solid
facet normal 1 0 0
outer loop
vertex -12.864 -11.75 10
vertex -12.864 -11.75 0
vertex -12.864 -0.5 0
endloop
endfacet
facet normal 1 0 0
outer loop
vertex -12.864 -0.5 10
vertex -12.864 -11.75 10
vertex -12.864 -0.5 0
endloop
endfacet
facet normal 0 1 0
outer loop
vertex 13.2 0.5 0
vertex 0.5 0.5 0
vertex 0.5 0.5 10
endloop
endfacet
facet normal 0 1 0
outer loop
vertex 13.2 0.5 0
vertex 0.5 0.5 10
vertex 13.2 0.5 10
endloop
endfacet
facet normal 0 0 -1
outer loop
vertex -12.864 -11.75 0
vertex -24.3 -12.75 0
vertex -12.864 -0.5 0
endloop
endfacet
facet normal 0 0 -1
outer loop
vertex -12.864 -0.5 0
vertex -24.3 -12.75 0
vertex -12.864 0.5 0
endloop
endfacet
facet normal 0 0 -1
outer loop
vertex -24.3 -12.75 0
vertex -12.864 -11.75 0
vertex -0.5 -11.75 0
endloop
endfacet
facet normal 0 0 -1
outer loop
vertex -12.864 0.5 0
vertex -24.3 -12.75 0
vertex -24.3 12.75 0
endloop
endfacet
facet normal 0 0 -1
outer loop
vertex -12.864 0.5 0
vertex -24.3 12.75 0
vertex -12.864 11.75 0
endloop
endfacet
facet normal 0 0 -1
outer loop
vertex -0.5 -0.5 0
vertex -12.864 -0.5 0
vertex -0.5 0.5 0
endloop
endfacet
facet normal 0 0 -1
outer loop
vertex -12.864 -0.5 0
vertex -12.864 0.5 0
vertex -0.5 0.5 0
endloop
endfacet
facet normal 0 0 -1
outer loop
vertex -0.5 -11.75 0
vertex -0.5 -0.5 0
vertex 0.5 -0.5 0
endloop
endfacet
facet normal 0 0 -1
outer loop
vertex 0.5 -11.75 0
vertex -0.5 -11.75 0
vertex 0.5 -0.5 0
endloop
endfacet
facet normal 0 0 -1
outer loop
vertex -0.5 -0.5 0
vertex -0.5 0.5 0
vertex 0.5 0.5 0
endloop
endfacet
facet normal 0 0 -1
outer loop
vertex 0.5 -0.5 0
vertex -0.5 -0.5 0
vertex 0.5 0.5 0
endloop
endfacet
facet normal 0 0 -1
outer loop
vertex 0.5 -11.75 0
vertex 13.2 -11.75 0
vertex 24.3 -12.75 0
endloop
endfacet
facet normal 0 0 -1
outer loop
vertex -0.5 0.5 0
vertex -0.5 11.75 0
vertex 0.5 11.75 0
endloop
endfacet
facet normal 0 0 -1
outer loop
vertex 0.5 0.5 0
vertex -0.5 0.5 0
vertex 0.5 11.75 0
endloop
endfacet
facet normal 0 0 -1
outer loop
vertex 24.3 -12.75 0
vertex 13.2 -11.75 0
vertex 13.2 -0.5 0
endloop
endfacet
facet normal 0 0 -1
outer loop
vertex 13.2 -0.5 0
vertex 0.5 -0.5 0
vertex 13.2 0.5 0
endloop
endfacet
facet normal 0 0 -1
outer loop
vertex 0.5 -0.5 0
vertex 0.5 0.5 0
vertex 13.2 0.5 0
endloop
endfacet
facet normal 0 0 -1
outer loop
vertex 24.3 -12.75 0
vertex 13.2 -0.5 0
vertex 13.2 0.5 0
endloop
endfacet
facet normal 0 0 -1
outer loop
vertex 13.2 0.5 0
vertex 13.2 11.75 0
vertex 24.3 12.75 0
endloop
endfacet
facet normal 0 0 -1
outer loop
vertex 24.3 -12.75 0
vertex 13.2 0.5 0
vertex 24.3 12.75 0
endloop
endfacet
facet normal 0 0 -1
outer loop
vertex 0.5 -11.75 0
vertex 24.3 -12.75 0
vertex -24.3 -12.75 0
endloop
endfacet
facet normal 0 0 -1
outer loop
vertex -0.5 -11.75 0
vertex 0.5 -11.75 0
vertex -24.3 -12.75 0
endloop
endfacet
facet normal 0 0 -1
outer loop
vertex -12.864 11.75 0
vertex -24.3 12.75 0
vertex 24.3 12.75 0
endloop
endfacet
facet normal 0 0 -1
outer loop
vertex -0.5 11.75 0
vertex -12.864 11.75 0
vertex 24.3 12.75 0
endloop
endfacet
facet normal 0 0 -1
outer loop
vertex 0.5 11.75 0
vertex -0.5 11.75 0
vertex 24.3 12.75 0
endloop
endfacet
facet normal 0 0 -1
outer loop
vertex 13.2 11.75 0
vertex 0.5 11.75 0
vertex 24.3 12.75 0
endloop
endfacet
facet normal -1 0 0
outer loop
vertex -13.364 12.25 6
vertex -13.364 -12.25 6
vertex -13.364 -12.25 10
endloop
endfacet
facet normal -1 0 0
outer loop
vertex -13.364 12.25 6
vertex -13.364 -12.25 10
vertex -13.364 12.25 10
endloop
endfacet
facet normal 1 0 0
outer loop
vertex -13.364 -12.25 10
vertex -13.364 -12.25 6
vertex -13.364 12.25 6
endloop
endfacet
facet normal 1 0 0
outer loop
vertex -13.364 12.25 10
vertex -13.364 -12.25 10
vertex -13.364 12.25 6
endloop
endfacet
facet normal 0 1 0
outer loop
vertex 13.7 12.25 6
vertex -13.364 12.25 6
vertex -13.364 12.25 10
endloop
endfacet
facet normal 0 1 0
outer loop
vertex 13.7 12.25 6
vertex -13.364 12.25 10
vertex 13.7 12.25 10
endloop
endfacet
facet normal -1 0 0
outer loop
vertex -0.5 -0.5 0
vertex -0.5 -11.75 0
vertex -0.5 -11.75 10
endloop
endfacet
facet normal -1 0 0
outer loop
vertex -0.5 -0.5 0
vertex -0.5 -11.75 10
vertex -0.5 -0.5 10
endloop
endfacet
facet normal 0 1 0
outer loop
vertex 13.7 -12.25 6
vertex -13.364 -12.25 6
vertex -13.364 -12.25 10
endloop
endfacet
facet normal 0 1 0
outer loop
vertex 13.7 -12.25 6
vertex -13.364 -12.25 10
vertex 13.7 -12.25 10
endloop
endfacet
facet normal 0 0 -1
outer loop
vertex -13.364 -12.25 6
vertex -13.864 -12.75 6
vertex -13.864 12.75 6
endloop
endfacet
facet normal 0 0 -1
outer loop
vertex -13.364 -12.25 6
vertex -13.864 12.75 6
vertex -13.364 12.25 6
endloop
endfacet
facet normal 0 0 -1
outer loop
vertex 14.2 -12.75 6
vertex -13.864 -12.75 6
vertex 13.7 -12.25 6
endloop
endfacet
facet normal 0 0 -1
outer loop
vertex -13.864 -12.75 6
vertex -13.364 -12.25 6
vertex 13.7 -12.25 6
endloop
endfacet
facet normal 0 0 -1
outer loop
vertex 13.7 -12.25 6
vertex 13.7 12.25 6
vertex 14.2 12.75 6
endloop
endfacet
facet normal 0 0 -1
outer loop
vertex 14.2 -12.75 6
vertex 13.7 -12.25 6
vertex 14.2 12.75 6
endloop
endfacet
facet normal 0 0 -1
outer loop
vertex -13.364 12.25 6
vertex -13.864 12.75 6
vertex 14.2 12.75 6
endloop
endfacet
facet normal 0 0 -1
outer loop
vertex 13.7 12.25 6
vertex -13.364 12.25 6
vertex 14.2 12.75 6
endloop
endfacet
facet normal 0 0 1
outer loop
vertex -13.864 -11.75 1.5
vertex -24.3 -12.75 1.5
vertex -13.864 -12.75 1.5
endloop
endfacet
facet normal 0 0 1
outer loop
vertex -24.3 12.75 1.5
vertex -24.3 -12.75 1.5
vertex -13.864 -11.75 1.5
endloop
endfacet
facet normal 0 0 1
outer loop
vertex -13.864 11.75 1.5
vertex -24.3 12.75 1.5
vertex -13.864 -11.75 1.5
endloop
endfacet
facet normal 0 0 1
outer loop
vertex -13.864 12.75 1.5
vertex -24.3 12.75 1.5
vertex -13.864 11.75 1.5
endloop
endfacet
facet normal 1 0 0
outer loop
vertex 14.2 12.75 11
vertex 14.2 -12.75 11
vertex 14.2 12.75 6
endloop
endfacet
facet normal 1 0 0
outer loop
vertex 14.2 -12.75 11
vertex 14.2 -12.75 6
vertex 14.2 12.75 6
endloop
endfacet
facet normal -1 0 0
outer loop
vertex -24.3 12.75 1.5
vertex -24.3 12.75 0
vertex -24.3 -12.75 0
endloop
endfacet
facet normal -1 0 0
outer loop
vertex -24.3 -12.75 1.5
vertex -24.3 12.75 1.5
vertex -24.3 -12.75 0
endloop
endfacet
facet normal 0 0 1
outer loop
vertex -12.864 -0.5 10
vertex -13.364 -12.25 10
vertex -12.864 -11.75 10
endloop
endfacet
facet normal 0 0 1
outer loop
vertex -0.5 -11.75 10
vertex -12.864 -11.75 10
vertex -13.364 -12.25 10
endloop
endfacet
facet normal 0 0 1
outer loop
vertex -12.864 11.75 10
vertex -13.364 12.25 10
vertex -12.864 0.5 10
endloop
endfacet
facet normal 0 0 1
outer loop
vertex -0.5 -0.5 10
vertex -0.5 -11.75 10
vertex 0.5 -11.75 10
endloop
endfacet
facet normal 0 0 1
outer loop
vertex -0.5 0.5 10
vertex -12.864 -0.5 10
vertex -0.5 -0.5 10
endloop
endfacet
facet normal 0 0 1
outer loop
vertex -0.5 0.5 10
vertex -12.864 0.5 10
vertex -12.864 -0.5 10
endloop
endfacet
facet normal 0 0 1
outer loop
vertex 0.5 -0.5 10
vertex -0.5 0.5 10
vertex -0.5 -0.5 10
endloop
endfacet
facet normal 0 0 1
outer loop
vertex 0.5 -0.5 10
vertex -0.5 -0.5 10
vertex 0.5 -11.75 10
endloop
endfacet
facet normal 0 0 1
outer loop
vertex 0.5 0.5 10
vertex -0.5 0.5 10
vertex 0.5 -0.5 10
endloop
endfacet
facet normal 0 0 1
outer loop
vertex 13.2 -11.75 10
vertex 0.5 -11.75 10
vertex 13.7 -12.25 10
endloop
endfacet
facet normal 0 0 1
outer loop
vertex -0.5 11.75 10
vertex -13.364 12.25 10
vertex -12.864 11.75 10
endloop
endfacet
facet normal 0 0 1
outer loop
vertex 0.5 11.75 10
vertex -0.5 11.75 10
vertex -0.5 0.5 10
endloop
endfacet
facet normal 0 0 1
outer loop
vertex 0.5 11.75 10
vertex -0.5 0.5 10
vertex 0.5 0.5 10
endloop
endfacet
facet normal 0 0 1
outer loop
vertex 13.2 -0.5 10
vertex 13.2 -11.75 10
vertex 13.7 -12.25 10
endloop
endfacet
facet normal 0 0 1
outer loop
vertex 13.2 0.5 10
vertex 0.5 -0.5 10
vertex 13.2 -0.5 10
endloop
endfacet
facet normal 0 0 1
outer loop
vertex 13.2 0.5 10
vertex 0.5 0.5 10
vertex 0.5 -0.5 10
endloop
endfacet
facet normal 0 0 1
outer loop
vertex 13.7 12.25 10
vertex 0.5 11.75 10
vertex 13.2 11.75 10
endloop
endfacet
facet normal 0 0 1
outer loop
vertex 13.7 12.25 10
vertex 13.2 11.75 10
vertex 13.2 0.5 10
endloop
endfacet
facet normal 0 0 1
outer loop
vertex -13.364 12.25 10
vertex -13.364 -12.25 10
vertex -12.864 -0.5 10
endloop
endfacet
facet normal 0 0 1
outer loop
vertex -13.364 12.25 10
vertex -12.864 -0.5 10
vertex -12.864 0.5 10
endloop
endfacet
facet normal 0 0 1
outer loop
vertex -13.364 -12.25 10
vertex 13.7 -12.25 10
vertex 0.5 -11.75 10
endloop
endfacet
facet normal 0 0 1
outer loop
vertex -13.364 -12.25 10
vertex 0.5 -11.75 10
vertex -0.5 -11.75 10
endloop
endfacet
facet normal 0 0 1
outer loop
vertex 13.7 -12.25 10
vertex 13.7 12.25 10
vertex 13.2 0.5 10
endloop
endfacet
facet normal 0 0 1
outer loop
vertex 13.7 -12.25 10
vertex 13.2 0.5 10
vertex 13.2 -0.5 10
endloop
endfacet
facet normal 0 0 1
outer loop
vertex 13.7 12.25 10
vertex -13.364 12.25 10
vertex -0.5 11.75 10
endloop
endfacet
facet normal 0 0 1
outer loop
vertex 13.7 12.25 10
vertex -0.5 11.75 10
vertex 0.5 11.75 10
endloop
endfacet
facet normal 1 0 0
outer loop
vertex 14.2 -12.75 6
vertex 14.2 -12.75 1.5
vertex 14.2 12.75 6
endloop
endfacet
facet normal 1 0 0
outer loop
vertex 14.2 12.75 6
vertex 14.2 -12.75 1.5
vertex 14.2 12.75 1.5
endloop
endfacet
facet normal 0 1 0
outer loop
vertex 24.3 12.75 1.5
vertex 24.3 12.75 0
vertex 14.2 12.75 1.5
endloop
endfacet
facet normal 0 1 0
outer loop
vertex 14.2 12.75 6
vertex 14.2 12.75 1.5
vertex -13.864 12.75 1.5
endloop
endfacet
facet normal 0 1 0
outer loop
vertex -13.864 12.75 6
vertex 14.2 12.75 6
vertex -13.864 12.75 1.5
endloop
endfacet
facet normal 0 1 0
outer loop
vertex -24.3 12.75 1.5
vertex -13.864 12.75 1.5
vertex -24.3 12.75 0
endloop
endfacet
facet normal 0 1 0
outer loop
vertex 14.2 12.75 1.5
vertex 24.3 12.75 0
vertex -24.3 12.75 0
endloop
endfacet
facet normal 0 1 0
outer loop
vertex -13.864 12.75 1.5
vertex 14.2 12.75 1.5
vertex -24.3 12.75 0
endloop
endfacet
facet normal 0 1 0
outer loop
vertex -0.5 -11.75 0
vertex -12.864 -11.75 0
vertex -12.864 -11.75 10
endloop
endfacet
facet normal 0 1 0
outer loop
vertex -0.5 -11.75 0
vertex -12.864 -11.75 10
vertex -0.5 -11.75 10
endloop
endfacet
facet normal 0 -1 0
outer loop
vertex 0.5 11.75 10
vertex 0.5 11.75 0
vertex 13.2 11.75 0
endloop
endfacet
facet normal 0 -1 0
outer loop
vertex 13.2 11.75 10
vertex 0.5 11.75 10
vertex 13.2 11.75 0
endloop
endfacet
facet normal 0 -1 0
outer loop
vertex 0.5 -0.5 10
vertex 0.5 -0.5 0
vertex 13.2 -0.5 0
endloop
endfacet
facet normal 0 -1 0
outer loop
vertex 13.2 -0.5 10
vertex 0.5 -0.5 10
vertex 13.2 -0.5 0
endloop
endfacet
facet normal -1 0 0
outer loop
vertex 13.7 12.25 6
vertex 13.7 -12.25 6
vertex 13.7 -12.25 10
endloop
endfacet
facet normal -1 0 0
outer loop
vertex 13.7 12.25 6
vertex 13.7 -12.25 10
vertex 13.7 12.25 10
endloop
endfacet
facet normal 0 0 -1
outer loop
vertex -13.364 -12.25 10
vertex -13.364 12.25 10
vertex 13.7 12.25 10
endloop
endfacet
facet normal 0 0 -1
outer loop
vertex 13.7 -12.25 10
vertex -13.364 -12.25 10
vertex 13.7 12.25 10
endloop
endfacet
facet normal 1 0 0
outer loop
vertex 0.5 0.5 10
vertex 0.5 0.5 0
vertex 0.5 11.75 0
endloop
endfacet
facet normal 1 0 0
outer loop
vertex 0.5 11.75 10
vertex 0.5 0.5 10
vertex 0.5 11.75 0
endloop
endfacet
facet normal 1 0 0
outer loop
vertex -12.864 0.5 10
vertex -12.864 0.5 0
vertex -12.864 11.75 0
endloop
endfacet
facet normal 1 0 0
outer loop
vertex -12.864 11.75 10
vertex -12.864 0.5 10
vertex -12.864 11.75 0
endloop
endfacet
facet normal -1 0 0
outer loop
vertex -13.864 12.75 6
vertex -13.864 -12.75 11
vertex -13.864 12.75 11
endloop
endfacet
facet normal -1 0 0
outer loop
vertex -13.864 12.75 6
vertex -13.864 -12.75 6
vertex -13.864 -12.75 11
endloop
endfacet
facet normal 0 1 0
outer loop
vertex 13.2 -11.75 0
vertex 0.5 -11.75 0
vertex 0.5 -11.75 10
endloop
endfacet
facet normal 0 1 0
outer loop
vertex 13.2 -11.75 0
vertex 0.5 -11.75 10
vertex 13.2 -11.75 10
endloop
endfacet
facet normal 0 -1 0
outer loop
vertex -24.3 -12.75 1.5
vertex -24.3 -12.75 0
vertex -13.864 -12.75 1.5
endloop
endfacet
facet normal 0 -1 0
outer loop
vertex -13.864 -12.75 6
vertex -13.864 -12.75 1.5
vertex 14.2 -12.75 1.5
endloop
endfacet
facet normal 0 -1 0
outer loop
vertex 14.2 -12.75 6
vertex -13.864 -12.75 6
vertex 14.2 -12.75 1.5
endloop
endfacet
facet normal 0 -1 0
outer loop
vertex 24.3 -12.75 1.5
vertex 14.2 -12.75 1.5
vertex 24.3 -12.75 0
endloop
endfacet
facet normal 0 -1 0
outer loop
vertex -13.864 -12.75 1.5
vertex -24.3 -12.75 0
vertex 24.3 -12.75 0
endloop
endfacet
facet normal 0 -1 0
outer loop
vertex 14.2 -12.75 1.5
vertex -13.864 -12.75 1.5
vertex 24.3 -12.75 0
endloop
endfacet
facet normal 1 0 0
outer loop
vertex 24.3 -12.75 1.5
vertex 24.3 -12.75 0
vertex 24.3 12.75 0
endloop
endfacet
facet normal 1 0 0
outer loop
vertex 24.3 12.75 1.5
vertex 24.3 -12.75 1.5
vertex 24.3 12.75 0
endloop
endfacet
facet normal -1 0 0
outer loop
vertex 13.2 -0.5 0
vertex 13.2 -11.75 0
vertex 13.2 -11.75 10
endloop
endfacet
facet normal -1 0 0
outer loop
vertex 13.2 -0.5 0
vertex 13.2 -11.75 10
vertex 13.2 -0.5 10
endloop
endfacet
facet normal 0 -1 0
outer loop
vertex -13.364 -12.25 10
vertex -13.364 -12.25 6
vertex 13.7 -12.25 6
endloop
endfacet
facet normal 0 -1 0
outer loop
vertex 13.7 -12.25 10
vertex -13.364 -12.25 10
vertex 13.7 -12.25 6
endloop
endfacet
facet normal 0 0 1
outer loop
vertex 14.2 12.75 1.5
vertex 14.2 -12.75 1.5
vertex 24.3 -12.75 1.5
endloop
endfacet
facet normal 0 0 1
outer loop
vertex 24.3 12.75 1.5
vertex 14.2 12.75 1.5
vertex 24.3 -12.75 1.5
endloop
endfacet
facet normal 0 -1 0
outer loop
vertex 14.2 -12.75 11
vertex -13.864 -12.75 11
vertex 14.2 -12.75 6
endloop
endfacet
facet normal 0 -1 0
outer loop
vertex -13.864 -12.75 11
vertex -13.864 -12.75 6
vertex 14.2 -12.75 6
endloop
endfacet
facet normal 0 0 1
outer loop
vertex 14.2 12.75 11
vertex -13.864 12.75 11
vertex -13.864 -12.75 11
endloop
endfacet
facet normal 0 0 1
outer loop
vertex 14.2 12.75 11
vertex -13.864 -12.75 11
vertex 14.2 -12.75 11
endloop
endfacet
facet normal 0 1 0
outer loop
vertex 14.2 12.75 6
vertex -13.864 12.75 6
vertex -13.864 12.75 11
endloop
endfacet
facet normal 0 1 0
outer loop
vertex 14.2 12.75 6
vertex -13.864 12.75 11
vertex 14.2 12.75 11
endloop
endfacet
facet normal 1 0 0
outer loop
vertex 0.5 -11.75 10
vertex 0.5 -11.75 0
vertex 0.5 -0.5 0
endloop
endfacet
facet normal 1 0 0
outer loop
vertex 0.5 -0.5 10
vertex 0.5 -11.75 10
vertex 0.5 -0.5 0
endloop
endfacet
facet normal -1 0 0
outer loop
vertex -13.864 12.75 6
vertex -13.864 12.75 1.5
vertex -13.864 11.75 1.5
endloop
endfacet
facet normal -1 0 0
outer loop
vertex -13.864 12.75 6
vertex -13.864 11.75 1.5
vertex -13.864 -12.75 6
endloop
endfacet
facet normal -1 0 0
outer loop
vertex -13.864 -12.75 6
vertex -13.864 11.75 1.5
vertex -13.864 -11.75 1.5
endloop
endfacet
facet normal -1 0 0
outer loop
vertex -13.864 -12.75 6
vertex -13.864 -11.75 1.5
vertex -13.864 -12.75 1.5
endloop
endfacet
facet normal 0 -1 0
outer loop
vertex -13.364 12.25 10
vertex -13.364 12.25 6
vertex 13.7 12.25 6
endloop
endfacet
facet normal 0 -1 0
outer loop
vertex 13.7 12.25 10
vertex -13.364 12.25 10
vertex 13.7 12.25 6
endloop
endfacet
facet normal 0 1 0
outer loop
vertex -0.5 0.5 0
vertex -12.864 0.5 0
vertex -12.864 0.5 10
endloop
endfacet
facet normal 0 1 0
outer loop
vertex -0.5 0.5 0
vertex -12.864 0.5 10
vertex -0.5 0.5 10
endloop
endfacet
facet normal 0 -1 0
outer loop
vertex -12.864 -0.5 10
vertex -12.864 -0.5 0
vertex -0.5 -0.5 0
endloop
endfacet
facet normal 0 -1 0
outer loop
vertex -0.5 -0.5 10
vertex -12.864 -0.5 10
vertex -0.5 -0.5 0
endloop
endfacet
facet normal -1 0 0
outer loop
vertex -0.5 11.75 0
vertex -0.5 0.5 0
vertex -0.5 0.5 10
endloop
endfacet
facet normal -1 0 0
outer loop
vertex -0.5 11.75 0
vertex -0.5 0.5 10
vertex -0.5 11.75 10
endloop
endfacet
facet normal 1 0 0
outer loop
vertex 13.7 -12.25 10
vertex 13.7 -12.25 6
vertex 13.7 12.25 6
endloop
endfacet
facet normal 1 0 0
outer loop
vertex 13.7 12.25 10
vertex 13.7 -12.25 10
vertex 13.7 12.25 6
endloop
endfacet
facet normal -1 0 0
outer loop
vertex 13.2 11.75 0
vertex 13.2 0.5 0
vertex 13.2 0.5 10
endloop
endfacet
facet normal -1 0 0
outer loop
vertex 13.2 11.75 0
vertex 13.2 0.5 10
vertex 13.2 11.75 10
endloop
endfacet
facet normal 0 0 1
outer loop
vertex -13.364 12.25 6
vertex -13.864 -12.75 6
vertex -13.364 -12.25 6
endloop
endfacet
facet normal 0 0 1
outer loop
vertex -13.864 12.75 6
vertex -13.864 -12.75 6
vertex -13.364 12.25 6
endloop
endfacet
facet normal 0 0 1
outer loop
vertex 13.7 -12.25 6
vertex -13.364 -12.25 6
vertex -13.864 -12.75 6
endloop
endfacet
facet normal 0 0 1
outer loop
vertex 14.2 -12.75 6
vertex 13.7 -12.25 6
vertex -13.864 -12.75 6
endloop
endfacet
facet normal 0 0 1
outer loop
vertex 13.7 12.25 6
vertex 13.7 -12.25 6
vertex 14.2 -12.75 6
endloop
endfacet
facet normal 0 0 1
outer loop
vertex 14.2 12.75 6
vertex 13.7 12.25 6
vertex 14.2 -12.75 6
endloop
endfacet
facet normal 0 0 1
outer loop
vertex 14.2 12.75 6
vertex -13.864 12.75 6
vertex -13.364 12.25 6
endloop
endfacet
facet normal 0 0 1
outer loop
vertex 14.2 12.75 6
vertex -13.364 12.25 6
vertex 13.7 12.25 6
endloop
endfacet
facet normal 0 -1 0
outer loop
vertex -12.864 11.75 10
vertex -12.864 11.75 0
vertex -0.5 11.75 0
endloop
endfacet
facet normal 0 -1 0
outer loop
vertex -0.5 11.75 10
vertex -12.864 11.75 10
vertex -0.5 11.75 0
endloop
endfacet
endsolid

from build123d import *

# Parameters (mm, degrees)
F0_W     = 9.1
F0_H     = 23.5
F1_DEPTH = 1.5
F0_W_2   = 9.4355237663
F0_W_3   = 27.0644762337
F0_H_2   = 24.5
F2_DEPTH = 6
F0_W_4   = 12.3644762337
F0_H_3   = 11.25
F0_W_5   = 12.7
F3_DEPTH = 10
F4_W     = 28.0644762337
F4_H     = 25.5
F4_W_2   = 27.0644762337
F4_H_2   = 24.5
F5_DEPTH = 4
F6_W     = 28.0644762337
F6_H     = 25.5
F7_DEPTH = 1


with BuildPart() as f1:
    # F0 (on Top) → F1 (new body)
    with BuildSketch(Plane.XY):
        with Locations((18.75, 0)):
            Rectangle(F0_W, F0_H)
        Polygon((24.3, -12.75), (24.3, 12.75), (14.2, 12.75), (14.2, 11.75), (23.3, 11.75), (23.3, -11.75), (14.2, -11.75), (14.2, -12.75), align=None)
    extrude(amount=F1_DEPTH)



with BuildPart() as f1b:
    # F0 (on Top) → F1, piece 2 (new body)
    with BuildSketch(Plane.XY):
        Polygon((-13.8644762337, 11.75), (-13.8644762337, 12.75), (-24.3, 12.75), (-24.3, -12.75), (-13.8644762337, -12.75), (-13.8644762337, -11.75), (-23.3, -11.75), (-23.3, 11.75), align=None)
        with Locations((-18.5822381169, 0)):
            Rectangle(F0_W_2, F0_H)
    extrude(amount=F1_DEPTH)


with BuildPart() as f1_1:
    add(f1.part)

    add(f1b.part)  # F2 merges F1b
    # F0 (on Top) → F2 (join)
    with BuildSketch(Plane.XY):
        Polygon((14.2, 11.75), (14.2, 12.75), (-13.8644762337, 12.75), (-13.8644762337, 11.75), (-13.8644762337, -11.75), (-13.8644762337, -12.75), (14.2, -12.75), (14.2, -11.75), align=None)
        with Locations((0.1677618831, 0)):
            Rectangle(F0_W_3, F0_H_2, mode=Mode.SUBTRACT)
    extrude(amount=F2_DEPTH)

    # F0 (on Top) → F3 (join)
    with BuildSketch(Plane.XY):
        with Locations((0.1677618831, 0)):
            Rectangle(F0_W_3, F0_H_2)
        with Locations((-6.6822381169, -6.125)):
            Rectangle(F0_W_4, F0_H_3, mode=Mode.SUBTRACT)
        with Locations((6.85, -6.125)):
            Rectangle(F0_W_5, F0_H_3, mode=Mode.SUBTRACT)
        with Locations((-6.6822381169, 6.125)):
            Rectangle(F0_W_4, F0_H_3, mode=Mode.SUBTRACT)
        with Locations((6.85, 6.125)):
            Rectangle(F0_W_5, F0_H_3, mode=Mode.SUBTRACT)
    extrude(amount=F3_DEPTH)


with BuildPart() as f5:
    # F4 (on face) → F5 (new body)
    with BuildSketch(Plane.XY.offset(6)):
        with Locations((0.1677618831, 0)):
            Rectangle(F4_W, F4_H)
        with Locations((0.1677618831, 0)):
            Rectangle(F4_W_2, F4_H_2, mode=Mode.SUBTRACT)
    extrude(amount=F5_DEPTH)

    # F6 (on face) → F7 (join)
    with BuildSketch(Plane.XY.offset(10)):
        with Locations((0.1677618831, 0)):
            Rectangle(F6_W, F6_H)
    extrude(amount=F7_DEPTH)


solid = Compound([f1_1.part, f5.part])
